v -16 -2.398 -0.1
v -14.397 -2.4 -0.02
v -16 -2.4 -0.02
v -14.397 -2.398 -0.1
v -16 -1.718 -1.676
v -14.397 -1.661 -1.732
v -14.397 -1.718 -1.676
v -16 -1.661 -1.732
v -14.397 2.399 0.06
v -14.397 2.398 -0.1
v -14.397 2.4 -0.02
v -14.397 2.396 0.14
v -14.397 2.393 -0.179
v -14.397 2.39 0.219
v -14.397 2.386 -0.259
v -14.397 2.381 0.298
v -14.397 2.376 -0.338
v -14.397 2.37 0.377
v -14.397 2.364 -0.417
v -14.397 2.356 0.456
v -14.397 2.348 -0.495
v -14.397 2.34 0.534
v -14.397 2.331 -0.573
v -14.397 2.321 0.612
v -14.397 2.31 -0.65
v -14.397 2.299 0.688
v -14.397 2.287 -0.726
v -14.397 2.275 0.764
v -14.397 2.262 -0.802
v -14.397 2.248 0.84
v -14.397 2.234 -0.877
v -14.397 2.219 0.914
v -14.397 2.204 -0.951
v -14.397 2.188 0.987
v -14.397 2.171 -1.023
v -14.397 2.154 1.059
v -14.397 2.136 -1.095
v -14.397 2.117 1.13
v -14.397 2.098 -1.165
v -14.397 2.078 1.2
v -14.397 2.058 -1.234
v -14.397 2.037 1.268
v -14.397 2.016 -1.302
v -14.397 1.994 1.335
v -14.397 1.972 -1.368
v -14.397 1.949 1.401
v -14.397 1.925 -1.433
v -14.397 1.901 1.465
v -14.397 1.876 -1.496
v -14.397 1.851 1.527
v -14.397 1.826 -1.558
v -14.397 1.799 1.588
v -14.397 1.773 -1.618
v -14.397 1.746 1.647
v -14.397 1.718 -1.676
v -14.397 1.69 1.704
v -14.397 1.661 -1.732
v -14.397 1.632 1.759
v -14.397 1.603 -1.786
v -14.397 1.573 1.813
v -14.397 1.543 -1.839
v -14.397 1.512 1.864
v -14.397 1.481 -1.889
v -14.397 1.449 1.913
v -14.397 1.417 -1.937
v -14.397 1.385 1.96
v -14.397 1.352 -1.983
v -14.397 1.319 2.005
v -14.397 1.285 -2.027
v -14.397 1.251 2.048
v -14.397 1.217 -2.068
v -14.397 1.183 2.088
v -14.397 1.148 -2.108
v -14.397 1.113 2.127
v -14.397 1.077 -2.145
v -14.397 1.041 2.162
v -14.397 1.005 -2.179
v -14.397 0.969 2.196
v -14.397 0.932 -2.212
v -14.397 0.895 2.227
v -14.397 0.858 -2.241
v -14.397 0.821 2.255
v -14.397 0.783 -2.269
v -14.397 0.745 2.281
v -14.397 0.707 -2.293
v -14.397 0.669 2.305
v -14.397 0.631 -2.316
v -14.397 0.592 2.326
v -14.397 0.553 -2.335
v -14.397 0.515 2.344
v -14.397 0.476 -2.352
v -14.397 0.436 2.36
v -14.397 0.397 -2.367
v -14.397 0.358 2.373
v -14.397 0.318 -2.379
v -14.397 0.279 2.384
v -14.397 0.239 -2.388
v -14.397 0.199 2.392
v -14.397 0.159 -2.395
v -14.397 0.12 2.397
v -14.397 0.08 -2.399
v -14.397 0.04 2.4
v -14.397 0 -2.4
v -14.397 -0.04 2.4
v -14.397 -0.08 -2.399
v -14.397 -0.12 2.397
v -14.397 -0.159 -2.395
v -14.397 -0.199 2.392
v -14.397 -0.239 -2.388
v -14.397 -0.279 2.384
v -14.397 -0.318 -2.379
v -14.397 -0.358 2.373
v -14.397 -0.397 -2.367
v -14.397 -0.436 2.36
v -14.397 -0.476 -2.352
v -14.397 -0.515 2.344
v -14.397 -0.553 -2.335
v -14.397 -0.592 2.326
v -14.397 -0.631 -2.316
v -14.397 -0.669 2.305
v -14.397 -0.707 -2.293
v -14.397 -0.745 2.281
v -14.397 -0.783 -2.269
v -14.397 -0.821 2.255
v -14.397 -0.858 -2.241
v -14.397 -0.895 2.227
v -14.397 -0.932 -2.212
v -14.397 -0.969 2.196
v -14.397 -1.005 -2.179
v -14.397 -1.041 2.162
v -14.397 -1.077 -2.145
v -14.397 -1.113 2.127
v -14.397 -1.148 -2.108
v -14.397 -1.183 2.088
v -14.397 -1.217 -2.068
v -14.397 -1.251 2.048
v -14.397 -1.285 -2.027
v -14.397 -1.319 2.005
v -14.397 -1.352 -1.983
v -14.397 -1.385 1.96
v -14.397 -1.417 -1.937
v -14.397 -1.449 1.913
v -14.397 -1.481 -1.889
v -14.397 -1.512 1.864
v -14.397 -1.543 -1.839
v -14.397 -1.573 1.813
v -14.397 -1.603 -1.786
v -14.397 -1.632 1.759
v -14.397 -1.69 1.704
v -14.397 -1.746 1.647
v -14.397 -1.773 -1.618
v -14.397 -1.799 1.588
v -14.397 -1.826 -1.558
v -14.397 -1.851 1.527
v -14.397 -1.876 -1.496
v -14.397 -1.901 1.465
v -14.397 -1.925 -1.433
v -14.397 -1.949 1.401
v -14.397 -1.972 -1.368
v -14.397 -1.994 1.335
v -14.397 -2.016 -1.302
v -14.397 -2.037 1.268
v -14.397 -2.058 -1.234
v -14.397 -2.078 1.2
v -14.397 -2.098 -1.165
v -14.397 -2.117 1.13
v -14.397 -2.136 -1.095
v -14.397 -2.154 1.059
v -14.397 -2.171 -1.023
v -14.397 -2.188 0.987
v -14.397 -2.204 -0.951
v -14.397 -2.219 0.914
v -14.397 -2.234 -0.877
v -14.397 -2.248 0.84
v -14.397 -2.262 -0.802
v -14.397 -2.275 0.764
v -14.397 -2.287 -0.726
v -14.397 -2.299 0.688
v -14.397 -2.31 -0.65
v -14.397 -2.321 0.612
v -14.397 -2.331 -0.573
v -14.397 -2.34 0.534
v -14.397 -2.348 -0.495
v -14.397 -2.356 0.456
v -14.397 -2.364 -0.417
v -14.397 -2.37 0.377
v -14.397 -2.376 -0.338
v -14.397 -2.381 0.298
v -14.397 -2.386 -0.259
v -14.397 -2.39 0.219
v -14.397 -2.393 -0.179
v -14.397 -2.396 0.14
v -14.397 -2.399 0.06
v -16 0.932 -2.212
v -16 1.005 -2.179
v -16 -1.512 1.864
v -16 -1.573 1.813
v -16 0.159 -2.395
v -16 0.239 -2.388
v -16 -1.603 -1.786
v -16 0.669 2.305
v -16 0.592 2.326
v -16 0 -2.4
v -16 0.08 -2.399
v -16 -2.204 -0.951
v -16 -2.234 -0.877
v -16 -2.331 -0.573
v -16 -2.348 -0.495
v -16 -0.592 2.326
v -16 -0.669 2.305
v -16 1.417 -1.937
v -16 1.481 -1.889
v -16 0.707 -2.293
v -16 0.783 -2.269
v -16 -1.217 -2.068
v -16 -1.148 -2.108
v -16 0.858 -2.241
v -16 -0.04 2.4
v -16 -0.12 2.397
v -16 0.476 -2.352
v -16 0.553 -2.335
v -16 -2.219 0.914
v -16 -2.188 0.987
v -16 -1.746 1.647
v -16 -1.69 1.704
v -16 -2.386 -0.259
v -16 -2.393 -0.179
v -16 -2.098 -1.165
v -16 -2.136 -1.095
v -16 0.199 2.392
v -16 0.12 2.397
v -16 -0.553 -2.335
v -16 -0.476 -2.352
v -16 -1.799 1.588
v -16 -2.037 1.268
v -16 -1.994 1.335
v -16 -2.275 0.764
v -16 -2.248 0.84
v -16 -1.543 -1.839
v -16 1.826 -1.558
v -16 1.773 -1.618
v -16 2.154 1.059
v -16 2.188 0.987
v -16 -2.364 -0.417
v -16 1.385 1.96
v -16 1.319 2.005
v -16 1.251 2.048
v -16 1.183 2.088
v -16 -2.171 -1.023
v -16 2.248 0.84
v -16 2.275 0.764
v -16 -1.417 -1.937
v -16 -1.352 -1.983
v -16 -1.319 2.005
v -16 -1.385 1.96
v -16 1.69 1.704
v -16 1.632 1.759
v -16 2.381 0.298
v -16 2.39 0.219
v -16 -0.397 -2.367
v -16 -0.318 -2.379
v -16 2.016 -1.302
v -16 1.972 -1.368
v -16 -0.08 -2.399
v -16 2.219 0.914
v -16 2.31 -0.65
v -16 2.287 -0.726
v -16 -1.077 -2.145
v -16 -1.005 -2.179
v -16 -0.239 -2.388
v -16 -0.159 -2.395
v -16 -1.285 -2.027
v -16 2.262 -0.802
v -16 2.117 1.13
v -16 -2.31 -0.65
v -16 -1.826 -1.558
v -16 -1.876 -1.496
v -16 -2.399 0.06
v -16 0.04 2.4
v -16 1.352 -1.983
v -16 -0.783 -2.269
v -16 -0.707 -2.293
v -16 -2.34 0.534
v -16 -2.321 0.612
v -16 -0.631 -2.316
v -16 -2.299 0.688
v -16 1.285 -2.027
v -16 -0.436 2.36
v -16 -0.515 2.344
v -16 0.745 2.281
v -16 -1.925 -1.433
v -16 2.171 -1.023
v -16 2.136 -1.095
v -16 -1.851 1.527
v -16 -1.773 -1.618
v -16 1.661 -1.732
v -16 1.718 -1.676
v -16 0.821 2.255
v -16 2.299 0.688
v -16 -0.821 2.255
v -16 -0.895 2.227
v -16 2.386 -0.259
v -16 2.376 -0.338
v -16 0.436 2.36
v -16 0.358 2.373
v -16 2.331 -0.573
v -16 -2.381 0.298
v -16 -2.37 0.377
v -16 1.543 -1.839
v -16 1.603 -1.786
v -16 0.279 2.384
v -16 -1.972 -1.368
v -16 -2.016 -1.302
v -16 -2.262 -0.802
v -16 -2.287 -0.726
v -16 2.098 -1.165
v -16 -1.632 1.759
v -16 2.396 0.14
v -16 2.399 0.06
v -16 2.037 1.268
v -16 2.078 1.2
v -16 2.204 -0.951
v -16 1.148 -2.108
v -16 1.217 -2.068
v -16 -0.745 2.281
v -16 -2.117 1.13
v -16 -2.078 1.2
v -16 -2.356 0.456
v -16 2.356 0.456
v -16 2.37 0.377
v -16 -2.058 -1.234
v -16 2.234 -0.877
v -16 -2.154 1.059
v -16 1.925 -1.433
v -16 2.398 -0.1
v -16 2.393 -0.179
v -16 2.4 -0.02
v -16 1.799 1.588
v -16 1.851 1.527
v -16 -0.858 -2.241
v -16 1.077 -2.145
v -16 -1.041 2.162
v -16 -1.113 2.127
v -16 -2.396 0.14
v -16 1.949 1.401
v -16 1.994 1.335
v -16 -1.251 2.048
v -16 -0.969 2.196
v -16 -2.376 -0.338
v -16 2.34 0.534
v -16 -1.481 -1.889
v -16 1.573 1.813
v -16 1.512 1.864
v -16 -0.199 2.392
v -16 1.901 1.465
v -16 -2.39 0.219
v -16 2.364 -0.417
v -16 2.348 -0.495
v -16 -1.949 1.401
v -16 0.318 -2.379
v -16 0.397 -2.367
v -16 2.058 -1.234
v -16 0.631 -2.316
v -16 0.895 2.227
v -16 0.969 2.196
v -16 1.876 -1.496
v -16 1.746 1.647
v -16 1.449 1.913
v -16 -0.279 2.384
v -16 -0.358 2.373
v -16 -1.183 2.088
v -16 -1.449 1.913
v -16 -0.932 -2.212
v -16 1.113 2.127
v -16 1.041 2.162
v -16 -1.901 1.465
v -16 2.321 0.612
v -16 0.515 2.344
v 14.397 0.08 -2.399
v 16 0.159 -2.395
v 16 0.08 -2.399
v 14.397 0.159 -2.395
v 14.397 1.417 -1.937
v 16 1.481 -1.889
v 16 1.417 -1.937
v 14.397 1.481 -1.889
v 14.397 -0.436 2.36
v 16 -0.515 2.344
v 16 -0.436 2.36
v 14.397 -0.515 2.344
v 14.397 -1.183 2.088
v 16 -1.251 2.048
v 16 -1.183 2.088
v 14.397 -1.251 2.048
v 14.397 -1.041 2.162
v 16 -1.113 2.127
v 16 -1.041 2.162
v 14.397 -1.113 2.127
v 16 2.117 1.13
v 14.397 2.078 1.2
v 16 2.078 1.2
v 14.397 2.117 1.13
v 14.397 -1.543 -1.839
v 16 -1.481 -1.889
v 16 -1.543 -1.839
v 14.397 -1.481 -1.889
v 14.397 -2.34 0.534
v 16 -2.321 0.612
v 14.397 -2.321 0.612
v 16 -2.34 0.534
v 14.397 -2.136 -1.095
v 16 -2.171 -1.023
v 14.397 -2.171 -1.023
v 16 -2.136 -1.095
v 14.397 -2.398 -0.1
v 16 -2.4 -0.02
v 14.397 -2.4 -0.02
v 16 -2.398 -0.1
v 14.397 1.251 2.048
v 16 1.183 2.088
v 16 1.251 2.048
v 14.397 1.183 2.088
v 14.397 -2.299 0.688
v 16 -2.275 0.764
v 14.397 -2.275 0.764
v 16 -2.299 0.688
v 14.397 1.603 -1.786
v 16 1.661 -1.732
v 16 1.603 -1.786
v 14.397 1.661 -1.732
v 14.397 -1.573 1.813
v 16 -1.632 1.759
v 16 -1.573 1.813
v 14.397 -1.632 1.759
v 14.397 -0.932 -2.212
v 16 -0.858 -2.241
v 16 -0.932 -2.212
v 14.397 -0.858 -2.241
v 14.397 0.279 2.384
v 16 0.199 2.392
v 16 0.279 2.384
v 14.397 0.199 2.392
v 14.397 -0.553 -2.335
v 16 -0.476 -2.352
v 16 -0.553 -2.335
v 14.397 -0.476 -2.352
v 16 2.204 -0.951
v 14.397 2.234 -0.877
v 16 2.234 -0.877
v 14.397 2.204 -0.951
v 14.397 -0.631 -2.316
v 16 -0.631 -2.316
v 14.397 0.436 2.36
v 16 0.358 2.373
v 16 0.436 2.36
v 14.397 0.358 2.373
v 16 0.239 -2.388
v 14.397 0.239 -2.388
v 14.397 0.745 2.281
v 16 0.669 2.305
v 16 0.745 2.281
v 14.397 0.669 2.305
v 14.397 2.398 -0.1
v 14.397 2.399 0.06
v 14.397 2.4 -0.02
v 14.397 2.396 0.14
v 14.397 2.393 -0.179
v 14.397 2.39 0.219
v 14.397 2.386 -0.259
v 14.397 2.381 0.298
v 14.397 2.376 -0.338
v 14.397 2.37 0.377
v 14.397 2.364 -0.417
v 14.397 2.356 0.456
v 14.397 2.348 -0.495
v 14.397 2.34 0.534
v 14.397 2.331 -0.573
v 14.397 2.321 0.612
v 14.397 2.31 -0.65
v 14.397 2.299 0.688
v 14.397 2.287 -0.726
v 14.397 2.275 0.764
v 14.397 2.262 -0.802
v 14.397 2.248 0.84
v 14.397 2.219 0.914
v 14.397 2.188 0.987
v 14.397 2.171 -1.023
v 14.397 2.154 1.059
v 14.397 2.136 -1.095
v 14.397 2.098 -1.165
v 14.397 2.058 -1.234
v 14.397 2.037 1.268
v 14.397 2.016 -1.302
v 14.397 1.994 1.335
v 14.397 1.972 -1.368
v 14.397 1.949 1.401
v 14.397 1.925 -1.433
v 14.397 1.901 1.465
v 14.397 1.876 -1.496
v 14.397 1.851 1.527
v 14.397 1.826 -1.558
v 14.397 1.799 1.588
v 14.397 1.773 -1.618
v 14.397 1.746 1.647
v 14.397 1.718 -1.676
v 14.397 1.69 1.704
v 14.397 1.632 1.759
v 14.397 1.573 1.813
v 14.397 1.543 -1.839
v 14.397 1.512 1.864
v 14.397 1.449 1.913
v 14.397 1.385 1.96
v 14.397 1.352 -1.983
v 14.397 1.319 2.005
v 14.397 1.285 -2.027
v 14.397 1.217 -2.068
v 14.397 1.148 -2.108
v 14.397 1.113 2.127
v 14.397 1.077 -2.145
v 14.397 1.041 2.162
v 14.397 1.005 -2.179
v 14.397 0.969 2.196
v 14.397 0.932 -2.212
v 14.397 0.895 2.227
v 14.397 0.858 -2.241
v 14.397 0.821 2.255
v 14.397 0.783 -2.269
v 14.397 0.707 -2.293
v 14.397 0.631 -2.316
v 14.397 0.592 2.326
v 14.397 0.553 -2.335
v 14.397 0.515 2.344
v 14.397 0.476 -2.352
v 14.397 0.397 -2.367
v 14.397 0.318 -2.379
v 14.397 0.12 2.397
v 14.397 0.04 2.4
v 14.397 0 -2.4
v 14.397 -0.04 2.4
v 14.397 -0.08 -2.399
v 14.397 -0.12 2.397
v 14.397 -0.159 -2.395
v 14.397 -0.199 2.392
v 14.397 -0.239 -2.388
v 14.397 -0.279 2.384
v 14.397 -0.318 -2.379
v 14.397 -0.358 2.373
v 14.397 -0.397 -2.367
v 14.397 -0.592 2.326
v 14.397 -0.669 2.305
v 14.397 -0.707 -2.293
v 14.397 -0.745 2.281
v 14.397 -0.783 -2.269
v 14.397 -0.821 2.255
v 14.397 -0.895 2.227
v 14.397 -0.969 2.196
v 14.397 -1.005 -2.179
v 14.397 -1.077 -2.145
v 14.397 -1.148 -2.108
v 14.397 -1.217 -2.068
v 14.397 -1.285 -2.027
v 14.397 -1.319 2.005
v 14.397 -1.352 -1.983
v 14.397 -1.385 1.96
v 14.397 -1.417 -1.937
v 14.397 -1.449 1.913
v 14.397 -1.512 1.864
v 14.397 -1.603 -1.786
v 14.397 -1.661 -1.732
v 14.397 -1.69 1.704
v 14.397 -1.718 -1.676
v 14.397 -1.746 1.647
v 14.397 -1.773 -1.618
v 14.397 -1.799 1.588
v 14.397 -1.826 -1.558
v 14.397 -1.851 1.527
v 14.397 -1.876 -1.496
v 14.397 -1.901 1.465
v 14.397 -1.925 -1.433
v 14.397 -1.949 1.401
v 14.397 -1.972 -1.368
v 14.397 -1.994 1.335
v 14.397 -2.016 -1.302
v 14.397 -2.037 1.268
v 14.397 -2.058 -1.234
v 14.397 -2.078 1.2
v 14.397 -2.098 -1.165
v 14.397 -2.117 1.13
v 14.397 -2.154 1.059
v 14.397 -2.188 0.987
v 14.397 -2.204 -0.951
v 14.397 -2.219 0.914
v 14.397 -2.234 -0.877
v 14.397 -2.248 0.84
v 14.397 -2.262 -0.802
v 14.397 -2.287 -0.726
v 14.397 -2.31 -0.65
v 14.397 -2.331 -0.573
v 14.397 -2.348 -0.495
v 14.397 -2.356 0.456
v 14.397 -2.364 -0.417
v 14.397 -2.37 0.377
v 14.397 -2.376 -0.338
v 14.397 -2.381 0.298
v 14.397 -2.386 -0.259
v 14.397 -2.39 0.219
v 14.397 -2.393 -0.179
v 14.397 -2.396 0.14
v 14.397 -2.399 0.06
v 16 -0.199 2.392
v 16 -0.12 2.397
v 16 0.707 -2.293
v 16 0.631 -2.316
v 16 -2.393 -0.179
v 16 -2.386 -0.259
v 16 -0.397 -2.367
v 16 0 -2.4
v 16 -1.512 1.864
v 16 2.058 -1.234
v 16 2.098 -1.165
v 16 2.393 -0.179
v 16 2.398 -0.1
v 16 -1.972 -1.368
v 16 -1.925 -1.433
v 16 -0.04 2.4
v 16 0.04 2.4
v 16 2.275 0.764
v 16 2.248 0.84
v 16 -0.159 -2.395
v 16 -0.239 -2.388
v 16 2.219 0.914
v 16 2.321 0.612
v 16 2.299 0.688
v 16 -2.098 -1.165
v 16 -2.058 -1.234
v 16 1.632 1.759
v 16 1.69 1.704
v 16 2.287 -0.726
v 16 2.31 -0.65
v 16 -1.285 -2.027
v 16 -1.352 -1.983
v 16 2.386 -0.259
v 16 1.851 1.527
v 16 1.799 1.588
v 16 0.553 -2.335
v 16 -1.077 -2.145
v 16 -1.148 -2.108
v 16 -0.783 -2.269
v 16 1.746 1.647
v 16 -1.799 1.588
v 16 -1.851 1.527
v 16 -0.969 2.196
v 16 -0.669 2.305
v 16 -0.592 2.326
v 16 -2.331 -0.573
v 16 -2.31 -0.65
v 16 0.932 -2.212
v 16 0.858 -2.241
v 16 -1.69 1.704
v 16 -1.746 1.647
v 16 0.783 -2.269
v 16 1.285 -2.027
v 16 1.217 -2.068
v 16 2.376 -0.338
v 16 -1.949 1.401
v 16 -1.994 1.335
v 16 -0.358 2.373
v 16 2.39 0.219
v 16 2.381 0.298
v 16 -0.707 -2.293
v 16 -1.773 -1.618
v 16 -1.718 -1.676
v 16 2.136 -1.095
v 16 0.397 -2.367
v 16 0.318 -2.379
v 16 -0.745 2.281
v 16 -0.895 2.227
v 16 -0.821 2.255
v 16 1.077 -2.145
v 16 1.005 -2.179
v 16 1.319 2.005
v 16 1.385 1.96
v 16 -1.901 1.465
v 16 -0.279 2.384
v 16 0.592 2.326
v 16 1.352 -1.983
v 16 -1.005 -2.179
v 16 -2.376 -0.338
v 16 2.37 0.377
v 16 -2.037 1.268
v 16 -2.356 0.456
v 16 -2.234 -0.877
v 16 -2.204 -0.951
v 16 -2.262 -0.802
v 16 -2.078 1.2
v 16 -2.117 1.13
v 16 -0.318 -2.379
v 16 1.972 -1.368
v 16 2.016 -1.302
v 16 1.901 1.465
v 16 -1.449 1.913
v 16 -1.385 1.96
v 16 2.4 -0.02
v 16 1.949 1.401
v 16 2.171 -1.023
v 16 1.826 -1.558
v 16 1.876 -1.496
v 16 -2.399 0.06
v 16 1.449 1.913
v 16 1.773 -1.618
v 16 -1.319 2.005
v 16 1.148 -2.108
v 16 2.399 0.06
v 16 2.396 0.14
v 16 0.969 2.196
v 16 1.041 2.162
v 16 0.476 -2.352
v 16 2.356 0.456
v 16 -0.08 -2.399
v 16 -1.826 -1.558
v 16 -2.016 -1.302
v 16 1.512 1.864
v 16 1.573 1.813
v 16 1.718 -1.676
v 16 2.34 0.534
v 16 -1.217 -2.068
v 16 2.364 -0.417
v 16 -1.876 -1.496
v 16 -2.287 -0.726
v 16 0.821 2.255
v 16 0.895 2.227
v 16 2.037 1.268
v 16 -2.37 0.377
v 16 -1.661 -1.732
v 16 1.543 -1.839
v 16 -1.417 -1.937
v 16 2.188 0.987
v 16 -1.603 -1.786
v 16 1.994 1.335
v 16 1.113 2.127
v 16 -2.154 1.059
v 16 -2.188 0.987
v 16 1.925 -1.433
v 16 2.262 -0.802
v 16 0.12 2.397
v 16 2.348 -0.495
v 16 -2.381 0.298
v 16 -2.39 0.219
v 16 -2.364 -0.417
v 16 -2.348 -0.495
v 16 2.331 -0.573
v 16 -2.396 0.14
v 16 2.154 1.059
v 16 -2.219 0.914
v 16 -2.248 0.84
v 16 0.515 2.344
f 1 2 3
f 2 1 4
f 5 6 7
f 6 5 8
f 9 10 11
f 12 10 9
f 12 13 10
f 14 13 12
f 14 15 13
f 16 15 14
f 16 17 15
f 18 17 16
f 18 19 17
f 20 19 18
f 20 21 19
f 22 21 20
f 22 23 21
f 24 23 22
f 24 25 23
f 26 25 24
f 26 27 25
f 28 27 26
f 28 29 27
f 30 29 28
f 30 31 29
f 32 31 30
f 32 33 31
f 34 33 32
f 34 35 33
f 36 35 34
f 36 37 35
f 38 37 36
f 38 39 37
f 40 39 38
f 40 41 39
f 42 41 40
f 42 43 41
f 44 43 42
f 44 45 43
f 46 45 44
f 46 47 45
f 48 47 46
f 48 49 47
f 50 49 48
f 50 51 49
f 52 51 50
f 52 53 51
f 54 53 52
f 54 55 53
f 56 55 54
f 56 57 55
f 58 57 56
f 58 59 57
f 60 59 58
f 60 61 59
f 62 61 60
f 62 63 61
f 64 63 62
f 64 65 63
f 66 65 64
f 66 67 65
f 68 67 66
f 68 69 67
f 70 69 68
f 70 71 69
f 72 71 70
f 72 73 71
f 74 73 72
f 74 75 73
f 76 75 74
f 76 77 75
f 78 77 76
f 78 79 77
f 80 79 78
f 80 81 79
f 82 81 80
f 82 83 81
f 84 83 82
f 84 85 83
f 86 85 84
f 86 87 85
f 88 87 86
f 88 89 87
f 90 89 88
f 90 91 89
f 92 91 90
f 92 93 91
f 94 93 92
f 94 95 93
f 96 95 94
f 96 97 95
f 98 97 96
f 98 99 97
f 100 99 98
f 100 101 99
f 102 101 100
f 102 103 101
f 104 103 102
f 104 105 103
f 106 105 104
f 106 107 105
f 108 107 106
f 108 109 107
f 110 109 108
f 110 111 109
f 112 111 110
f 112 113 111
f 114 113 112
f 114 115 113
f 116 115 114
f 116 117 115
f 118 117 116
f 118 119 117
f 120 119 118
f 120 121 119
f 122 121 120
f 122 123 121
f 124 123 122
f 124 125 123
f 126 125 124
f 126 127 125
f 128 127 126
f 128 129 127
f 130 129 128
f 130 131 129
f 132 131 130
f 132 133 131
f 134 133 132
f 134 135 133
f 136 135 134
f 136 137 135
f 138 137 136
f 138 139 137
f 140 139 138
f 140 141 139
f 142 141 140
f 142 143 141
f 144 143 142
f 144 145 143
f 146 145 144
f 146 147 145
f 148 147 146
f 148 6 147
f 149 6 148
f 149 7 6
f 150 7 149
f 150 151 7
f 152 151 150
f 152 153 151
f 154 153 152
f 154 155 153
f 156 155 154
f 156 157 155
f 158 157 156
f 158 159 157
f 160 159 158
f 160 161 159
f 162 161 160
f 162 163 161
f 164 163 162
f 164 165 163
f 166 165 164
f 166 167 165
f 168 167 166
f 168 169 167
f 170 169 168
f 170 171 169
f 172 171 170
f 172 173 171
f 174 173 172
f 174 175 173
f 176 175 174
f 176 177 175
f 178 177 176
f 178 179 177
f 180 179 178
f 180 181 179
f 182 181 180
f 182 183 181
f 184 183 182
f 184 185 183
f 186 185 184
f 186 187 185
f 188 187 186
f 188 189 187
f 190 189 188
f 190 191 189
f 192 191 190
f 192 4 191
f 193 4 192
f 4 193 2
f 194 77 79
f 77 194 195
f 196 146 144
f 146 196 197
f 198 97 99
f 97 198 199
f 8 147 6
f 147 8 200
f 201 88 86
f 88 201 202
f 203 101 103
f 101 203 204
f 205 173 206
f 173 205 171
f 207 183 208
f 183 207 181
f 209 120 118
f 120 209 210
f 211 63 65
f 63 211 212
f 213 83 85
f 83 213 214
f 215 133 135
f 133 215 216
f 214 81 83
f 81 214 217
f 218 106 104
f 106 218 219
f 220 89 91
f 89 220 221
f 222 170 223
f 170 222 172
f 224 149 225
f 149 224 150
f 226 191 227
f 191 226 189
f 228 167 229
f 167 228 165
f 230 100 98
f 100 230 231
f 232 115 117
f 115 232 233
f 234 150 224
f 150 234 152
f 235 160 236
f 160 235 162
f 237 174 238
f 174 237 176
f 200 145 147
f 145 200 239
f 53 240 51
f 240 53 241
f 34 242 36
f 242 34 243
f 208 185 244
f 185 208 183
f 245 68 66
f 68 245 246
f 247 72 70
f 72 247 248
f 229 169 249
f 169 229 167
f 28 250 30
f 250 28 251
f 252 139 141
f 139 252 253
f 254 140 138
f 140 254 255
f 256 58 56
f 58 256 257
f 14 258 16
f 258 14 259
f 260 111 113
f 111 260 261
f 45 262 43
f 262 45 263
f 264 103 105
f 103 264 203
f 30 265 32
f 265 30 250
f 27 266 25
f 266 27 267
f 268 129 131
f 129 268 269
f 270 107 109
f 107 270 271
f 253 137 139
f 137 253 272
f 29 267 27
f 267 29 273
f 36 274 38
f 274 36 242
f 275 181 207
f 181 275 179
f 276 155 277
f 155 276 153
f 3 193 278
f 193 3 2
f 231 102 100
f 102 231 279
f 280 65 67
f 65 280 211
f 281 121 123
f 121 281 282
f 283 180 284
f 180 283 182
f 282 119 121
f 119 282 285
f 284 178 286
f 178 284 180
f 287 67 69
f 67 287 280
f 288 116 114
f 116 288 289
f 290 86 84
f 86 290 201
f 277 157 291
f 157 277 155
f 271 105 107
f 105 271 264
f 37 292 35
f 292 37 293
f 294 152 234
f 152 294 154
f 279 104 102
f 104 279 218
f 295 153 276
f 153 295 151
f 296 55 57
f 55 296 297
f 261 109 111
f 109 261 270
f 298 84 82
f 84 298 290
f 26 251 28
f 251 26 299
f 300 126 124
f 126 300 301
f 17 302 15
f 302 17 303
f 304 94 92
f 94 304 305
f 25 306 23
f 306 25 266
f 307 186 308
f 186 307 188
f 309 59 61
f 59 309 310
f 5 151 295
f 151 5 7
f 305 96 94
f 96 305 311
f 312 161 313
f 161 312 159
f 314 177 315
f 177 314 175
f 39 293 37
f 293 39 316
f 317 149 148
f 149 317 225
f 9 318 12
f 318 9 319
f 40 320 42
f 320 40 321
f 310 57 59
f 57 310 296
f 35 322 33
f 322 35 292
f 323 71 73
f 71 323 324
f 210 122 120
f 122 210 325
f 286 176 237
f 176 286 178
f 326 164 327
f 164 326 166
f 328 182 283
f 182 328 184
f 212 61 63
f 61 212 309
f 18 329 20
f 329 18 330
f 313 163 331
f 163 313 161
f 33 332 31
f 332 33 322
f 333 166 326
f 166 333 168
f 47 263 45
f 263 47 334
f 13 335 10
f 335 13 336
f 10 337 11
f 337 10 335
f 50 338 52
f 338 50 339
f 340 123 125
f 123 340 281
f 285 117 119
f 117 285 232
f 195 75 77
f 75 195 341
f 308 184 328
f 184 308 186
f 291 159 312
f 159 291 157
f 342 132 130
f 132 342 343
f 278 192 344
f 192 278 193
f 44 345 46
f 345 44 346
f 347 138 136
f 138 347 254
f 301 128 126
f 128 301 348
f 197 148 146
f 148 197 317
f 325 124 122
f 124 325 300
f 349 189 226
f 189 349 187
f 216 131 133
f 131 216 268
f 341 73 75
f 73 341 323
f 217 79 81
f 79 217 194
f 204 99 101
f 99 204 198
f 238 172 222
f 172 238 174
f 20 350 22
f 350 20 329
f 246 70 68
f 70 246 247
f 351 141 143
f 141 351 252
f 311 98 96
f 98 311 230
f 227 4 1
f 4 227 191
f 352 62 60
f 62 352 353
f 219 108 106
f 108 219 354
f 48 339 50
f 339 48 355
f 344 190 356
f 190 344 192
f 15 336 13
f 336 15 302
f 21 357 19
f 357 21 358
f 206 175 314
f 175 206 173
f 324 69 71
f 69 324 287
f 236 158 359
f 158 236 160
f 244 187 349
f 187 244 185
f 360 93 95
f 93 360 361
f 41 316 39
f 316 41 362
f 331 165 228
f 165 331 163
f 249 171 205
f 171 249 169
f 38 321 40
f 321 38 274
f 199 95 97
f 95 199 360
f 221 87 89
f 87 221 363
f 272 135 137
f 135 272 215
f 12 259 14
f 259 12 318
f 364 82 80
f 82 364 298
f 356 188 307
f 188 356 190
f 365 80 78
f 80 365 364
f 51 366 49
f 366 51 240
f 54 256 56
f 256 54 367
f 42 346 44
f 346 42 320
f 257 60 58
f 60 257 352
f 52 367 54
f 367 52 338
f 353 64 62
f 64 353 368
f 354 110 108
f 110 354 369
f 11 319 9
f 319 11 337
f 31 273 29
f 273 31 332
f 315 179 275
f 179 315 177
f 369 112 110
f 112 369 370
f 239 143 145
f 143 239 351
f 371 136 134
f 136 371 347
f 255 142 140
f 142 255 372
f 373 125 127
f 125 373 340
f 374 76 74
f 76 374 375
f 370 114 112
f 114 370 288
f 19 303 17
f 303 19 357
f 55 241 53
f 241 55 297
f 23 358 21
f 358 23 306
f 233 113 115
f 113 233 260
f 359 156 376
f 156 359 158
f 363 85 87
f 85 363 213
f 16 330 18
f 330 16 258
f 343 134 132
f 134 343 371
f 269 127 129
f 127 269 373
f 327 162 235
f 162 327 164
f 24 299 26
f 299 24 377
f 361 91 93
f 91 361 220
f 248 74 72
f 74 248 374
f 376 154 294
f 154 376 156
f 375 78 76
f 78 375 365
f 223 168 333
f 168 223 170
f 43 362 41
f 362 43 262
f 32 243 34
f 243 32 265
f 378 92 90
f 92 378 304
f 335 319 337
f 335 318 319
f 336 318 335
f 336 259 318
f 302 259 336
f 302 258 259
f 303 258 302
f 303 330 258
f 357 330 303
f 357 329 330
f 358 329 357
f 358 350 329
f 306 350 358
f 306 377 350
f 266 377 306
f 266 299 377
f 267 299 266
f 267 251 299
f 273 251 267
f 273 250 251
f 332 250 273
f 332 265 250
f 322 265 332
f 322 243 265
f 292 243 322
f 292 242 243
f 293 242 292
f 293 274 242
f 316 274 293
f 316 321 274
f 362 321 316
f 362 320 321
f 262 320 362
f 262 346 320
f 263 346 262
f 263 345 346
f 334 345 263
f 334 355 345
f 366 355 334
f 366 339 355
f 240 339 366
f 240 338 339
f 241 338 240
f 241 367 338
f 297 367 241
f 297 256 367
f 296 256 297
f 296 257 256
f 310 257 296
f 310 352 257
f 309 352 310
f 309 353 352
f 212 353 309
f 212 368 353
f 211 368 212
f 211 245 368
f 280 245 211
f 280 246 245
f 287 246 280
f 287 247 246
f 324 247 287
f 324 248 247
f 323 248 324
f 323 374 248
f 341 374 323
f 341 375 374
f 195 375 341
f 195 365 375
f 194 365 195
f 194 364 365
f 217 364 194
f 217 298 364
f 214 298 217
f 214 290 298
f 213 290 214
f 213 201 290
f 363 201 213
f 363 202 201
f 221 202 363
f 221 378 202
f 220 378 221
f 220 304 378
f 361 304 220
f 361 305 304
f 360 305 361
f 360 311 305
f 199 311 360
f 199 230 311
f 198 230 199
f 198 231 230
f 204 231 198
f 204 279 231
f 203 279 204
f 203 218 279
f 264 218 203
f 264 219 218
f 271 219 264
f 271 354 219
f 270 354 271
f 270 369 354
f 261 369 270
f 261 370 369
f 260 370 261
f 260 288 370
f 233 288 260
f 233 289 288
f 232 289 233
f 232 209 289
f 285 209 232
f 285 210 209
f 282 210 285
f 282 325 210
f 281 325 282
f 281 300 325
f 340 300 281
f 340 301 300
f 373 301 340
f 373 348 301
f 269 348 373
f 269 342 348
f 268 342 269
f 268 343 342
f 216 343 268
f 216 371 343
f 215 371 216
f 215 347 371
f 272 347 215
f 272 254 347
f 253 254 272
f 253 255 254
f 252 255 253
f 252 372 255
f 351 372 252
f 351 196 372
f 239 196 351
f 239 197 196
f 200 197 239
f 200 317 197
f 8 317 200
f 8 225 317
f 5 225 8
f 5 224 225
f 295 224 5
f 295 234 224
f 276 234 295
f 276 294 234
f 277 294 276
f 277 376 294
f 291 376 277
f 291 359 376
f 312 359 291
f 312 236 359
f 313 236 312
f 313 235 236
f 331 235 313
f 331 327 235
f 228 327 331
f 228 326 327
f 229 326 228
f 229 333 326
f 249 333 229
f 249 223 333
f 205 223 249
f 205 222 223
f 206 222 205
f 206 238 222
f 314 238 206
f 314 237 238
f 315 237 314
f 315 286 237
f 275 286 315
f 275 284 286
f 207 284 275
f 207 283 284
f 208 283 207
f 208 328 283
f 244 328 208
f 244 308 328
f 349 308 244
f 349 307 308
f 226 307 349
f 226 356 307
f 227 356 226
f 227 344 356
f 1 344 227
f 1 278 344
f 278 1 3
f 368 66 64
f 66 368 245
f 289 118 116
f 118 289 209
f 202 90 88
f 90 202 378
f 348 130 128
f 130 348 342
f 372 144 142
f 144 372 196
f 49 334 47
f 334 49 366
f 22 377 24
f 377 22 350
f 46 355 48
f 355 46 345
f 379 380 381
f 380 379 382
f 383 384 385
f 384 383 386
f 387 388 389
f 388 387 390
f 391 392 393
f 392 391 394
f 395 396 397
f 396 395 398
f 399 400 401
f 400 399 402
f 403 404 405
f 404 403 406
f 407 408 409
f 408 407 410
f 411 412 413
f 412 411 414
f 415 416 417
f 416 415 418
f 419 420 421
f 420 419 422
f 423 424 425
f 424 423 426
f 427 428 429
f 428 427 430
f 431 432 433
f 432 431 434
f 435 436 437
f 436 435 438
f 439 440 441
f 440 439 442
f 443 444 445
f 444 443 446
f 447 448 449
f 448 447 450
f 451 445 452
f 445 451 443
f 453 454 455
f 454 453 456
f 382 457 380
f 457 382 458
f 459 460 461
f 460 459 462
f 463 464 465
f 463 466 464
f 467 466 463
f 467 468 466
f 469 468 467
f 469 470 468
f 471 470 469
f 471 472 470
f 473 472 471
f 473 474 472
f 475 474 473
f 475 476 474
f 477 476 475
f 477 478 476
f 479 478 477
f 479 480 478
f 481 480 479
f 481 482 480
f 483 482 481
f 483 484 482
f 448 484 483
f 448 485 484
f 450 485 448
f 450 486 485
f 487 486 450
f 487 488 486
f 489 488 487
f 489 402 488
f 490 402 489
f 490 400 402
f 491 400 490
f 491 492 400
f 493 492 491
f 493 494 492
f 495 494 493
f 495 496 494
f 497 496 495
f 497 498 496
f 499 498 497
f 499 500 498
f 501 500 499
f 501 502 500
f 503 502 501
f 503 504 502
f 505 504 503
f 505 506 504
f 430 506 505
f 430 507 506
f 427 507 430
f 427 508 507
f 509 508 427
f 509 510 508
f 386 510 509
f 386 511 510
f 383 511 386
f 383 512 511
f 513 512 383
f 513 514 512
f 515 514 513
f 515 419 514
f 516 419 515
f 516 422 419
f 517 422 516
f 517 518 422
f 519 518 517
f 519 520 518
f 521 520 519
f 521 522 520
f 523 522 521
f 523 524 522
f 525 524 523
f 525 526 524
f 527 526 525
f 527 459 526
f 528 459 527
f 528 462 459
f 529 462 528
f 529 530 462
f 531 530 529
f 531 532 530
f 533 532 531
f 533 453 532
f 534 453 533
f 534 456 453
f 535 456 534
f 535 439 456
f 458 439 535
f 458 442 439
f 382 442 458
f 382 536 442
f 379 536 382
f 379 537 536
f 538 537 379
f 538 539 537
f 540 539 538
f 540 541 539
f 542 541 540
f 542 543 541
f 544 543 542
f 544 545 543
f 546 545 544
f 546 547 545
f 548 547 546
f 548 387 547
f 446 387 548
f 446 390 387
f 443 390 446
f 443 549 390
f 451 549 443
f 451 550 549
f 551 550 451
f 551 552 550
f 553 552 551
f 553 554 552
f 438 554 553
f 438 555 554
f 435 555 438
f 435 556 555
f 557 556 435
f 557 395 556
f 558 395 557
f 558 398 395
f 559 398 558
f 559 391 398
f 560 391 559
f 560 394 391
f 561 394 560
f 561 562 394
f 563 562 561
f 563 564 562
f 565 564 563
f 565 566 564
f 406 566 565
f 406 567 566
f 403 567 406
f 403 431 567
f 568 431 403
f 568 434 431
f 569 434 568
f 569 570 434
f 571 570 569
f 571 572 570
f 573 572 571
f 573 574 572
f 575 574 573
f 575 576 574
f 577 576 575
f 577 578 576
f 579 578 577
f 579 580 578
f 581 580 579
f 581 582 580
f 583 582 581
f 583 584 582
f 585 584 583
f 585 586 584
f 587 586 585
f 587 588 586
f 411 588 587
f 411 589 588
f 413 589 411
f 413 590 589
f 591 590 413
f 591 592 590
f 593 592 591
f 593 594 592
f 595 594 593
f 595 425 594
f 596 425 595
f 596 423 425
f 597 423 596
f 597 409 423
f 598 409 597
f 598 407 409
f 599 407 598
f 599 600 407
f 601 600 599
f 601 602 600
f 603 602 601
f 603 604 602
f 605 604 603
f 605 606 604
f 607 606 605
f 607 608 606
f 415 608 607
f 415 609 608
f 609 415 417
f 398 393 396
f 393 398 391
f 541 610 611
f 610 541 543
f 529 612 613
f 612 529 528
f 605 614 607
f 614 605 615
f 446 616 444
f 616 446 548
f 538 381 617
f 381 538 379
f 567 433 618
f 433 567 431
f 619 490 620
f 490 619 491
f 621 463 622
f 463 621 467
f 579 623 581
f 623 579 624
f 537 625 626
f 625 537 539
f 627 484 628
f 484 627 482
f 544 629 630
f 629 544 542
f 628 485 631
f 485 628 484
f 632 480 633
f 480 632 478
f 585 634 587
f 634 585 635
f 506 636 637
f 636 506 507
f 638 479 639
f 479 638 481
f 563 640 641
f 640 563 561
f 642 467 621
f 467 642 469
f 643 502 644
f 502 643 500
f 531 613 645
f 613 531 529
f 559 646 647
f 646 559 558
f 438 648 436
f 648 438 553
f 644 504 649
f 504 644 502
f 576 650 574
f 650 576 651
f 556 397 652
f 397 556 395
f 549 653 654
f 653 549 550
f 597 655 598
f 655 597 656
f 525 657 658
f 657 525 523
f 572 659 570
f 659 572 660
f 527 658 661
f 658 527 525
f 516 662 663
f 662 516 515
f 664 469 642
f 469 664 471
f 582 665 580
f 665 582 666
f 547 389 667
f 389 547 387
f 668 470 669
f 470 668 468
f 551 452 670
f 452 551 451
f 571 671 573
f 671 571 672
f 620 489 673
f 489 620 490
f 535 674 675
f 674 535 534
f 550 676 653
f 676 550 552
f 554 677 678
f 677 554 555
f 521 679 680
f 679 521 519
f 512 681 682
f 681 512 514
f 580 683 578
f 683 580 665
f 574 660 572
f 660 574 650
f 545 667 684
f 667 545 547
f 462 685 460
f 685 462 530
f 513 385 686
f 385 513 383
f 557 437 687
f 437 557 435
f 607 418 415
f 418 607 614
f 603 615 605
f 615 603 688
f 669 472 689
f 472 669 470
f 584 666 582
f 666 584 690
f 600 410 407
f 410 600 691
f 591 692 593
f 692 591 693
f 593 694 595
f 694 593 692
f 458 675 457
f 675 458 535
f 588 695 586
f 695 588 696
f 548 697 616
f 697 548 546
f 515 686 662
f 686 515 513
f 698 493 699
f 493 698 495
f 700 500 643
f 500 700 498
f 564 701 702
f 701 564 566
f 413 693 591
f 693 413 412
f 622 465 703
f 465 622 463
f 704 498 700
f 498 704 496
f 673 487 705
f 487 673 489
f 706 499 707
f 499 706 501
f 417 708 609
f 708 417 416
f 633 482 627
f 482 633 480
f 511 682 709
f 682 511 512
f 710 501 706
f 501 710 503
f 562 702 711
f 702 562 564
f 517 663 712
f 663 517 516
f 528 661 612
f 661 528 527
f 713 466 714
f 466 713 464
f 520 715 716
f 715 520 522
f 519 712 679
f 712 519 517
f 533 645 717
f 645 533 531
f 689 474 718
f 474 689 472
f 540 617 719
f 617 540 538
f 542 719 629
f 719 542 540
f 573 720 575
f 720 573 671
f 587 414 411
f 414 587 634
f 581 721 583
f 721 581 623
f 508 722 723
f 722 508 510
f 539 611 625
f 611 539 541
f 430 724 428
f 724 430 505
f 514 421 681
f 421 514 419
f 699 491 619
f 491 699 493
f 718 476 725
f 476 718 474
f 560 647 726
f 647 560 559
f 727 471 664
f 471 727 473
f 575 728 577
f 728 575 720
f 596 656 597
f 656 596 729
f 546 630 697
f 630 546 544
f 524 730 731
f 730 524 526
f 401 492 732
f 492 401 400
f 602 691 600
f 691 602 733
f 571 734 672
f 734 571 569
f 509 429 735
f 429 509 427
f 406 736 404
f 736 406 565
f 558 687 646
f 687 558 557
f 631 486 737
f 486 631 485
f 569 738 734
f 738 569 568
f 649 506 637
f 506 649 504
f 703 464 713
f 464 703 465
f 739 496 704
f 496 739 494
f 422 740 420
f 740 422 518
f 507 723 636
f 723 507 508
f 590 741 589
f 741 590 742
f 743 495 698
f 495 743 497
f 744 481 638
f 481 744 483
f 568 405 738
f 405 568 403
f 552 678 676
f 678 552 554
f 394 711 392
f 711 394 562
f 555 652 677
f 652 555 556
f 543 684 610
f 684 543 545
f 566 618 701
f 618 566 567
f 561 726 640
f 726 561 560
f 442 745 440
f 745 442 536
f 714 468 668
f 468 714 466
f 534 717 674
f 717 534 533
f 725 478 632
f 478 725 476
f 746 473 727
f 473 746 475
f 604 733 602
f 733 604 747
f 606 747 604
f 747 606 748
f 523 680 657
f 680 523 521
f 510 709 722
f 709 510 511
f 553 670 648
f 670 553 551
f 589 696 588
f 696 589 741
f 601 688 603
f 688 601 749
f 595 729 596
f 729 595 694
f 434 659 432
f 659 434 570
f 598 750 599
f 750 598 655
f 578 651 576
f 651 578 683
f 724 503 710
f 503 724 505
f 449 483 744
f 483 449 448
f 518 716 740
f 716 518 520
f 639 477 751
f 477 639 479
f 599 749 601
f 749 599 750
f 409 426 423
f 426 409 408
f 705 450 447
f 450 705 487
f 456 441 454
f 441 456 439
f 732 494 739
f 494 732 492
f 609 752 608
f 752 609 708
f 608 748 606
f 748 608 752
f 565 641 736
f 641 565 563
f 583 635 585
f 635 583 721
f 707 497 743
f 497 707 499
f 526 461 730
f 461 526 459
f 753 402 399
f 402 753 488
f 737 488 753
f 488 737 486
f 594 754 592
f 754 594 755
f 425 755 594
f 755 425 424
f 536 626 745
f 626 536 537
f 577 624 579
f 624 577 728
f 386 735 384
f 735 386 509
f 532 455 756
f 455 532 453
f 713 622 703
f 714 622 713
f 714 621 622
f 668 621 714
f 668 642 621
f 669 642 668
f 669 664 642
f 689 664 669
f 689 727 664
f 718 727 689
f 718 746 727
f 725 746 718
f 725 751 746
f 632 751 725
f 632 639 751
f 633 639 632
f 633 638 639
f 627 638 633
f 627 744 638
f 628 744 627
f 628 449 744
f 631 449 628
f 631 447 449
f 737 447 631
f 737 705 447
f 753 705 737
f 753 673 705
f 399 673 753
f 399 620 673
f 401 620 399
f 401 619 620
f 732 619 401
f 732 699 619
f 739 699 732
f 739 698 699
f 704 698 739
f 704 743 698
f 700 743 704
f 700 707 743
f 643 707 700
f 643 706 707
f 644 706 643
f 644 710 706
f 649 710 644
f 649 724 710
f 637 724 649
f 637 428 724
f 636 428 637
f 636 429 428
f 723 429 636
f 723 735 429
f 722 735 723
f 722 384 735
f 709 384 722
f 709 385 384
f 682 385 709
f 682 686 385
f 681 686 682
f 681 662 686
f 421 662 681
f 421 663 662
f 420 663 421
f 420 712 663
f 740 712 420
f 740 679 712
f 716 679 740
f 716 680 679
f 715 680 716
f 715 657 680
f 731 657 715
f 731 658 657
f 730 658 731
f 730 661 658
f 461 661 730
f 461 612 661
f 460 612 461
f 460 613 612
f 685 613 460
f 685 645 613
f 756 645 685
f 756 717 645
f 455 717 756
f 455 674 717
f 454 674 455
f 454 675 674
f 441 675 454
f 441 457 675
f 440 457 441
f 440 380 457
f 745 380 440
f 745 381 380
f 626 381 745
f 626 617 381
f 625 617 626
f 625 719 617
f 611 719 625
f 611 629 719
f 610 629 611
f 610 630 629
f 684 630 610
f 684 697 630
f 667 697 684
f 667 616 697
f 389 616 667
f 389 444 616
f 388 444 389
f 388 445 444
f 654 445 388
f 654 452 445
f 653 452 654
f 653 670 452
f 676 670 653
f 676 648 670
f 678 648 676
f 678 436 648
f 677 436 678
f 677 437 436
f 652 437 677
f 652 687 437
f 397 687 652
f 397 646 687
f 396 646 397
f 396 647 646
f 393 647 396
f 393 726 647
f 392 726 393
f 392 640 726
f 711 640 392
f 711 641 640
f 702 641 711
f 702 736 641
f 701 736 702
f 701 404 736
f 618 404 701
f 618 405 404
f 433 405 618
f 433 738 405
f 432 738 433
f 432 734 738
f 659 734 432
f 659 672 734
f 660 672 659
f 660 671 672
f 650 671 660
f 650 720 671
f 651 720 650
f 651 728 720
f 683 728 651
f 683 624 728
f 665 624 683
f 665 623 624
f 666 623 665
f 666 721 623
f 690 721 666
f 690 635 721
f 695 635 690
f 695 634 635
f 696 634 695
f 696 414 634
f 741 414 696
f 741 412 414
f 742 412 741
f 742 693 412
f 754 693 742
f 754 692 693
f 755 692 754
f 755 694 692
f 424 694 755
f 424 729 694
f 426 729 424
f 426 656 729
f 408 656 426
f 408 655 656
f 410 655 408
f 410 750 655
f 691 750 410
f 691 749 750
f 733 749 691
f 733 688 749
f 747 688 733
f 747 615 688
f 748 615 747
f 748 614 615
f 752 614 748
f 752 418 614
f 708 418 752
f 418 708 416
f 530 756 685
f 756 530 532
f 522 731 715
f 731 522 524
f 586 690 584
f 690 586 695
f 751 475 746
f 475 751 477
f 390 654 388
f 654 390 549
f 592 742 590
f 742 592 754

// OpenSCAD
use <../lib.scad>
use <20.scad>
use <u9132.scad>
$fa=1; $fs=0.2;
function ldraw_lib__u9132c01(realsolid=false) = [
// 0 ~Axle Steel  4 x  72 LDU with Two Wheels  4 x  8
// 0 Name: u9132c01.dat
// 0 Author: William Howard [WilliamH]
// 0 !LDRAW_ORG Shortcut UPDATE 2013-02
// 0 !LICENSE Licensed under CC BY 2.0 and CC BY 4.0 : see CAreadme.txt
// 
// 0 BFC CERTIFY CCW
  [0,"BFC","CERTIFY"],
  [0,"BFC","CCW"],
// 
// 0 !CATEGORY Wheel
// 
// 0 !HISTORY 2011-07-10 [Steffen] made axle separate part
// 0 !HISTORY 2011-12-10 [Steffen] changed color 383 to 494
// 0 !HISTORY 2011-12-29 [PTadmin] Official Update 2011-02
// 0 !HISTORY 2013-08-29 [cwdee] Update category
// 0 !HISTORY 2013-12-23 [PTadmin] Official Update 2013-02
// 
// 
// 1 16 -31 0 0 0 0 1 0 1 0 -1 0 0 20.dat
  [1,16,-31,0,0,0,0,1,0,1,0,-1,0,0, ldraw_lib__20(realsolid)],
// 1 16 31 0 0 0 0 -1 0 1 0 1 0 0 20.dat
  [1,16,31,0,0,0,0,-1,0,1,0,1,0,0, ldraw_lib__20(realsolid)],
// 1 494 0 0 0 1 0 0 0 1 0 0 0 1 u9132.dat
  [1,494,0,0,0,1,0,0,0,1,0,0,0,1, ldraw_lib__u9132(realsolid)],
];
module ldraw_lib__u9132c01(step=0, col=false, unit=2/5, alt=false, line=0.2, solid=!$preview)
    makepoly(ldraw_lib__u9132c01(solid), step=step, col=col, unit=unit, alt=alt, line=line, solid=solid);
ldraw_lib__u9132c01(line=0.2);
